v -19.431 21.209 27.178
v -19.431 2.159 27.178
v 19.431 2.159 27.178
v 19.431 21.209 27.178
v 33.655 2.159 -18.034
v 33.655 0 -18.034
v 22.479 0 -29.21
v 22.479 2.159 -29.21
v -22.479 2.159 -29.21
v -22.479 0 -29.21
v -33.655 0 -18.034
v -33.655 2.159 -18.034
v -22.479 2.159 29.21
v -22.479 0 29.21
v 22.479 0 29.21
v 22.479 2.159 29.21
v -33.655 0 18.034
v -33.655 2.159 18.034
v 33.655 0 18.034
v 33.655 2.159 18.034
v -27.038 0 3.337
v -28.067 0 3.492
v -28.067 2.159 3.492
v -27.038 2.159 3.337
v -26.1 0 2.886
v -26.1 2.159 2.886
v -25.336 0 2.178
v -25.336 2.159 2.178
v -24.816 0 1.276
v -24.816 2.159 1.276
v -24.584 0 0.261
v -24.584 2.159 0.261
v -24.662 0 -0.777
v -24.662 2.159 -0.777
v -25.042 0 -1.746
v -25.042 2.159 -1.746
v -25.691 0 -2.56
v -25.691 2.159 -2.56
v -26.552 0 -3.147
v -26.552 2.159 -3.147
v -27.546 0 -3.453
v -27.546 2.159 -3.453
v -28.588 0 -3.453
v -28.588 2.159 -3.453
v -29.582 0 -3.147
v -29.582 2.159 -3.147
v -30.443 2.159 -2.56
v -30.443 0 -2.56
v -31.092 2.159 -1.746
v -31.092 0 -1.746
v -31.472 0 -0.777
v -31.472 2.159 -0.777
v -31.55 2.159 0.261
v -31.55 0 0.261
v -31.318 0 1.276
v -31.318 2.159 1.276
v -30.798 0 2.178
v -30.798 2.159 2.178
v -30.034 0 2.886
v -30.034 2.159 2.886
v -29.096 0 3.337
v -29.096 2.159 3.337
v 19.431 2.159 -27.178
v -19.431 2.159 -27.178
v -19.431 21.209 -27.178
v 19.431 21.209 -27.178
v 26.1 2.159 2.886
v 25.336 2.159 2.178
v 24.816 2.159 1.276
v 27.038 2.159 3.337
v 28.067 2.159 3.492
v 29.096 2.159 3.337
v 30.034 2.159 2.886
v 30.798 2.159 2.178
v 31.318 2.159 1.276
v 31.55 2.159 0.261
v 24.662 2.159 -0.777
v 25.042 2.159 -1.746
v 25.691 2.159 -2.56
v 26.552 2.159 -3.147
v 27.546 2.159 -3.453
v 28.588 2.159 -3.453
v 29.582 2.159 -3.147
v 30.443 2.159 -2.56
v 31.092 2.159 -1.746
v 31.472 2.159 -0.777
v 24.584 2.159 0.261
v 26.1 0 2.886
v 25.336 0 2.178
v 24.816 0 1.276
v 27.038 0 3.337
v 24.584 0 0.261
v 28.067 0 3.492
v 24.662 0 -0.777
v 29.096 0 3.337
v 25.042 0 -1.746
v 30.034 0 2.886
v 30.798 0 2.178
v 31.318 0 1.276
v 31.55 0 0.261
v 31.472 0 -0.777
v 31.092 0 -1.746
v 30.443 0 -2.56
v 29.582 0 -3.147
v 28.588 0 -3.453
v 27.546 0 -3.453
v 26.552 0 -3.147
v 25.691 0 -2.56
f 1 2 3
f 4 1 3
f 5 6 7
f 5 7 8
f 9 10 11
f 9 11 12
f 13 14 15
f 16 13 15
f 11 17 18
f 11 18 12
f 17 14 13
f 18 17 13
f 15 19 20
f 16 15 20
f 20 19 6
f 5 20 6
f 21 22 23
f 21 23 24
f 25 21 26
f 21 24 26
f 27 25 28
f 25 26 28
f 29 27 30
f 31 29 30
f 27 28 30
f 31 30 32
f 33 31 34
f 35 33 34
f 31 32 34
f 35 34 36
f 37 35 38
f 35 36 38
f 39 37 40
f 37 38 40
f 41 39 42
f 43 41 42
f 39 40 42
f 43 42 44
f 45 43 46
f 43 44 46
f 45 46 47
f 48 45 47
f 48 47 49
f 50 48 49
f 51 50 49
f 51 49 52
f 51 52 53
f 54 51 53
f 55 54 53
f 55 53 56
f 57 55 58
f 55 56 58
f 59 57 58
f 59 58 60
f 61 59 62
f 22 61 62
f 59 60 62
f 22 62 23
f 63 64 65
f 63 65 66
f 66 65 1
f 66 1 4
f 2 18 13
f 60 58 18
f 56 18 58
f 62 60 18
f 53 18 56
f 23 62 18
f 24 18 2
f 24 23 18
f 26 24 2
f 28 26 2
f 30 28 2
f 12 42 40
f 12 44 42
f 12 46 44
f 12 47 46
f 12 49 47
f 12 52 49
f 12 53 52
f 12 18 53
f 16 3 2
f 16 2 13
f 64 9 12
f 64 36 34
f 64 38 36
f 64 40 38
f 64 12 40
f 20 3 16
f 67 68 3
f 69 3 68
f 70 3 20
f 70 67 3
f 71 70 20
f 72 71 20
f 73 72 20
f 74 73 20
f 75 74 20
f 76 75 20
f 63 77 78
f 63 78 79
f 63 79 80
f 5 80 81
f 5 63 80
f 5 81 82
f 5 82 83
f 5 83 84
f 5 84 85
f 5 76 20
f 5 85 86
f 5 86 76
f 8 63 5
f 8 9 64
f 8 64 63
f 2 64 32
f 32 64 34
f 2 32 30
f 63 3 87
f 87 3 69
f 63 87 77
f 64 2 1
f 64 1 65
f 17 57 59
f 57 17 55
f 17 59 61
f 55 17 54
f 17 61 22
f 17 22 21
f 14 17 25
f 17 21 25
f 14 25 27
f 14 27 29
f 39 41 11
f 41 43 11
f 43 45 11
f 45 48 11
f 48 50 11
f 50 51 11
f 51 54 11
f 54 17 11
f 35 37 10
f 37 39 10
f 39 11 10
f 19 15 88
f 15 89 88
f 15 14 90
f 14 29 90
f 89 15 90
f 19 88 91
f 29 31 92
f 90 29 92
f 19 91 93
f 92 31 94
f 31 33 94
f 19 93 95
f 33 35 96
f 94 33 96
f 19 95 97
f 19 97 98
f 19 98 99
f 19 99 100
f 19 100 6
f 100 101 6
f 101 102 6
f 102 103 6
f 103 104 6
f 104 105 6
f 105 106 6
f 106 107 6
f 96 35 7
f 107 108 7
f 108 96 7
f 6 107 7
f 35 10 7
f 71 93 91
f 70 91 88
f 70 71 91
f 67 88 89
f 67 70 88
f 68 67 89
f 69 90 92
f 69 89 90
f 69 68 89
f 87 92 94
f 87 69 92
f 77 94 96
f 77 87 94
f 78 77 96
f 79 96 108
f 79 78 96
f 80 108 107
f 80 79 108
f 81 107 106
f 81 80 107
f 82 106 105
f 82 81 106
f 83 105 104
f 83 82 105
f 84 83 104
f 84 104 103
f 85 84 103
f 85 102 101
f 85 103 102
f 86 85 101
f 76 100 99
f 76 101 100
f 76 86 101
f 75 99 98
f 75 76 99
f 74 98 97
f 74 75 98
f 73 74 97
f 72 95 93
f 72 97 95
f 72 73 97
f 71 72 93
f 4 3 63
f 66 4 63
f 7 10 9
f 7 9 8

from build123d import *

# Parameters (mm, degrees)
SKETCH1_W           = 67.31
SKETCH1_H           = 58.42
BOSS_EXTRUDE1_DEPTH = 2.159
SKETCH2_W           = 38.862
SKETCH2_H           = 54.356
BOSS_EXTRUDE3_DEPTH = 19.05
CHAMFER1_SIZE       = 11.176


with BuildPart() as part:
    # Sketch1 → Boss-Extrude1 (new body)
    with BuildSketch(Plane(origin=(0, 0, 0), x_dir=(1, 0, 0), z_dir=(0, 1, 0))):
        Rectangle(SKETCH1_W, SKETCH1_H)
    extrude(amount=BOSS_EXTRUDE1_DEPTH)

    # Sketch2 → Boss-Extrude3 (add)
    with BuildSketch(Plane(origin=(0, 2.159, 0), x_dir=(1, 0, 0), z_dir=(0, 1, 0))):
        Rectangle(SKETCH2_W, SKETCH2_H)
    extrude(amount=BOSS_EXTRUDE3_DEPTH)

    # Sketch5 → #97 (0.275) Diameter Hole1 (revolve, cut)
    with BuildSketch(Plane(origin=(28.067, 2.159, 0), x_dir=(0, 0, 1), z_dir=(1, 0, 0))):
        Polygon((0, 0), (0, 6.162505712), (3.4925, 4.064), (3.4925, 0), align=None)
    f_97_0_275_diameter_hole1 = revolve(axis=Axis((28.067, 8.509, 0), (0, -1, 0)), mode=Mode.SUBTRACT)

    # Mirror1: #97 (0.275) Diameter Hole1 across plane
    add(f_97_0_275_diameter_hole1.mirror(Plane(origin=(0, 0, 0), x_dir=(0, 0, 1), z_dir=(1, 0, 0))), mode=Mode.SUBTRACT)

    # Chamfer1
    chamfer1_edges = [part.edges().sort_by_distance(p)[0] for p in [
        (33.655, 1.0795, 29.21),
        (-33.655, 1.0795, 29.21),
        (-33.655, 1.0795, -29.21),
        (33.655, 1.0795, -29.21),
    ]]
    chamfer(chamfer1_edges, length=CHAMFER1_SIZE)


solid = part.part
